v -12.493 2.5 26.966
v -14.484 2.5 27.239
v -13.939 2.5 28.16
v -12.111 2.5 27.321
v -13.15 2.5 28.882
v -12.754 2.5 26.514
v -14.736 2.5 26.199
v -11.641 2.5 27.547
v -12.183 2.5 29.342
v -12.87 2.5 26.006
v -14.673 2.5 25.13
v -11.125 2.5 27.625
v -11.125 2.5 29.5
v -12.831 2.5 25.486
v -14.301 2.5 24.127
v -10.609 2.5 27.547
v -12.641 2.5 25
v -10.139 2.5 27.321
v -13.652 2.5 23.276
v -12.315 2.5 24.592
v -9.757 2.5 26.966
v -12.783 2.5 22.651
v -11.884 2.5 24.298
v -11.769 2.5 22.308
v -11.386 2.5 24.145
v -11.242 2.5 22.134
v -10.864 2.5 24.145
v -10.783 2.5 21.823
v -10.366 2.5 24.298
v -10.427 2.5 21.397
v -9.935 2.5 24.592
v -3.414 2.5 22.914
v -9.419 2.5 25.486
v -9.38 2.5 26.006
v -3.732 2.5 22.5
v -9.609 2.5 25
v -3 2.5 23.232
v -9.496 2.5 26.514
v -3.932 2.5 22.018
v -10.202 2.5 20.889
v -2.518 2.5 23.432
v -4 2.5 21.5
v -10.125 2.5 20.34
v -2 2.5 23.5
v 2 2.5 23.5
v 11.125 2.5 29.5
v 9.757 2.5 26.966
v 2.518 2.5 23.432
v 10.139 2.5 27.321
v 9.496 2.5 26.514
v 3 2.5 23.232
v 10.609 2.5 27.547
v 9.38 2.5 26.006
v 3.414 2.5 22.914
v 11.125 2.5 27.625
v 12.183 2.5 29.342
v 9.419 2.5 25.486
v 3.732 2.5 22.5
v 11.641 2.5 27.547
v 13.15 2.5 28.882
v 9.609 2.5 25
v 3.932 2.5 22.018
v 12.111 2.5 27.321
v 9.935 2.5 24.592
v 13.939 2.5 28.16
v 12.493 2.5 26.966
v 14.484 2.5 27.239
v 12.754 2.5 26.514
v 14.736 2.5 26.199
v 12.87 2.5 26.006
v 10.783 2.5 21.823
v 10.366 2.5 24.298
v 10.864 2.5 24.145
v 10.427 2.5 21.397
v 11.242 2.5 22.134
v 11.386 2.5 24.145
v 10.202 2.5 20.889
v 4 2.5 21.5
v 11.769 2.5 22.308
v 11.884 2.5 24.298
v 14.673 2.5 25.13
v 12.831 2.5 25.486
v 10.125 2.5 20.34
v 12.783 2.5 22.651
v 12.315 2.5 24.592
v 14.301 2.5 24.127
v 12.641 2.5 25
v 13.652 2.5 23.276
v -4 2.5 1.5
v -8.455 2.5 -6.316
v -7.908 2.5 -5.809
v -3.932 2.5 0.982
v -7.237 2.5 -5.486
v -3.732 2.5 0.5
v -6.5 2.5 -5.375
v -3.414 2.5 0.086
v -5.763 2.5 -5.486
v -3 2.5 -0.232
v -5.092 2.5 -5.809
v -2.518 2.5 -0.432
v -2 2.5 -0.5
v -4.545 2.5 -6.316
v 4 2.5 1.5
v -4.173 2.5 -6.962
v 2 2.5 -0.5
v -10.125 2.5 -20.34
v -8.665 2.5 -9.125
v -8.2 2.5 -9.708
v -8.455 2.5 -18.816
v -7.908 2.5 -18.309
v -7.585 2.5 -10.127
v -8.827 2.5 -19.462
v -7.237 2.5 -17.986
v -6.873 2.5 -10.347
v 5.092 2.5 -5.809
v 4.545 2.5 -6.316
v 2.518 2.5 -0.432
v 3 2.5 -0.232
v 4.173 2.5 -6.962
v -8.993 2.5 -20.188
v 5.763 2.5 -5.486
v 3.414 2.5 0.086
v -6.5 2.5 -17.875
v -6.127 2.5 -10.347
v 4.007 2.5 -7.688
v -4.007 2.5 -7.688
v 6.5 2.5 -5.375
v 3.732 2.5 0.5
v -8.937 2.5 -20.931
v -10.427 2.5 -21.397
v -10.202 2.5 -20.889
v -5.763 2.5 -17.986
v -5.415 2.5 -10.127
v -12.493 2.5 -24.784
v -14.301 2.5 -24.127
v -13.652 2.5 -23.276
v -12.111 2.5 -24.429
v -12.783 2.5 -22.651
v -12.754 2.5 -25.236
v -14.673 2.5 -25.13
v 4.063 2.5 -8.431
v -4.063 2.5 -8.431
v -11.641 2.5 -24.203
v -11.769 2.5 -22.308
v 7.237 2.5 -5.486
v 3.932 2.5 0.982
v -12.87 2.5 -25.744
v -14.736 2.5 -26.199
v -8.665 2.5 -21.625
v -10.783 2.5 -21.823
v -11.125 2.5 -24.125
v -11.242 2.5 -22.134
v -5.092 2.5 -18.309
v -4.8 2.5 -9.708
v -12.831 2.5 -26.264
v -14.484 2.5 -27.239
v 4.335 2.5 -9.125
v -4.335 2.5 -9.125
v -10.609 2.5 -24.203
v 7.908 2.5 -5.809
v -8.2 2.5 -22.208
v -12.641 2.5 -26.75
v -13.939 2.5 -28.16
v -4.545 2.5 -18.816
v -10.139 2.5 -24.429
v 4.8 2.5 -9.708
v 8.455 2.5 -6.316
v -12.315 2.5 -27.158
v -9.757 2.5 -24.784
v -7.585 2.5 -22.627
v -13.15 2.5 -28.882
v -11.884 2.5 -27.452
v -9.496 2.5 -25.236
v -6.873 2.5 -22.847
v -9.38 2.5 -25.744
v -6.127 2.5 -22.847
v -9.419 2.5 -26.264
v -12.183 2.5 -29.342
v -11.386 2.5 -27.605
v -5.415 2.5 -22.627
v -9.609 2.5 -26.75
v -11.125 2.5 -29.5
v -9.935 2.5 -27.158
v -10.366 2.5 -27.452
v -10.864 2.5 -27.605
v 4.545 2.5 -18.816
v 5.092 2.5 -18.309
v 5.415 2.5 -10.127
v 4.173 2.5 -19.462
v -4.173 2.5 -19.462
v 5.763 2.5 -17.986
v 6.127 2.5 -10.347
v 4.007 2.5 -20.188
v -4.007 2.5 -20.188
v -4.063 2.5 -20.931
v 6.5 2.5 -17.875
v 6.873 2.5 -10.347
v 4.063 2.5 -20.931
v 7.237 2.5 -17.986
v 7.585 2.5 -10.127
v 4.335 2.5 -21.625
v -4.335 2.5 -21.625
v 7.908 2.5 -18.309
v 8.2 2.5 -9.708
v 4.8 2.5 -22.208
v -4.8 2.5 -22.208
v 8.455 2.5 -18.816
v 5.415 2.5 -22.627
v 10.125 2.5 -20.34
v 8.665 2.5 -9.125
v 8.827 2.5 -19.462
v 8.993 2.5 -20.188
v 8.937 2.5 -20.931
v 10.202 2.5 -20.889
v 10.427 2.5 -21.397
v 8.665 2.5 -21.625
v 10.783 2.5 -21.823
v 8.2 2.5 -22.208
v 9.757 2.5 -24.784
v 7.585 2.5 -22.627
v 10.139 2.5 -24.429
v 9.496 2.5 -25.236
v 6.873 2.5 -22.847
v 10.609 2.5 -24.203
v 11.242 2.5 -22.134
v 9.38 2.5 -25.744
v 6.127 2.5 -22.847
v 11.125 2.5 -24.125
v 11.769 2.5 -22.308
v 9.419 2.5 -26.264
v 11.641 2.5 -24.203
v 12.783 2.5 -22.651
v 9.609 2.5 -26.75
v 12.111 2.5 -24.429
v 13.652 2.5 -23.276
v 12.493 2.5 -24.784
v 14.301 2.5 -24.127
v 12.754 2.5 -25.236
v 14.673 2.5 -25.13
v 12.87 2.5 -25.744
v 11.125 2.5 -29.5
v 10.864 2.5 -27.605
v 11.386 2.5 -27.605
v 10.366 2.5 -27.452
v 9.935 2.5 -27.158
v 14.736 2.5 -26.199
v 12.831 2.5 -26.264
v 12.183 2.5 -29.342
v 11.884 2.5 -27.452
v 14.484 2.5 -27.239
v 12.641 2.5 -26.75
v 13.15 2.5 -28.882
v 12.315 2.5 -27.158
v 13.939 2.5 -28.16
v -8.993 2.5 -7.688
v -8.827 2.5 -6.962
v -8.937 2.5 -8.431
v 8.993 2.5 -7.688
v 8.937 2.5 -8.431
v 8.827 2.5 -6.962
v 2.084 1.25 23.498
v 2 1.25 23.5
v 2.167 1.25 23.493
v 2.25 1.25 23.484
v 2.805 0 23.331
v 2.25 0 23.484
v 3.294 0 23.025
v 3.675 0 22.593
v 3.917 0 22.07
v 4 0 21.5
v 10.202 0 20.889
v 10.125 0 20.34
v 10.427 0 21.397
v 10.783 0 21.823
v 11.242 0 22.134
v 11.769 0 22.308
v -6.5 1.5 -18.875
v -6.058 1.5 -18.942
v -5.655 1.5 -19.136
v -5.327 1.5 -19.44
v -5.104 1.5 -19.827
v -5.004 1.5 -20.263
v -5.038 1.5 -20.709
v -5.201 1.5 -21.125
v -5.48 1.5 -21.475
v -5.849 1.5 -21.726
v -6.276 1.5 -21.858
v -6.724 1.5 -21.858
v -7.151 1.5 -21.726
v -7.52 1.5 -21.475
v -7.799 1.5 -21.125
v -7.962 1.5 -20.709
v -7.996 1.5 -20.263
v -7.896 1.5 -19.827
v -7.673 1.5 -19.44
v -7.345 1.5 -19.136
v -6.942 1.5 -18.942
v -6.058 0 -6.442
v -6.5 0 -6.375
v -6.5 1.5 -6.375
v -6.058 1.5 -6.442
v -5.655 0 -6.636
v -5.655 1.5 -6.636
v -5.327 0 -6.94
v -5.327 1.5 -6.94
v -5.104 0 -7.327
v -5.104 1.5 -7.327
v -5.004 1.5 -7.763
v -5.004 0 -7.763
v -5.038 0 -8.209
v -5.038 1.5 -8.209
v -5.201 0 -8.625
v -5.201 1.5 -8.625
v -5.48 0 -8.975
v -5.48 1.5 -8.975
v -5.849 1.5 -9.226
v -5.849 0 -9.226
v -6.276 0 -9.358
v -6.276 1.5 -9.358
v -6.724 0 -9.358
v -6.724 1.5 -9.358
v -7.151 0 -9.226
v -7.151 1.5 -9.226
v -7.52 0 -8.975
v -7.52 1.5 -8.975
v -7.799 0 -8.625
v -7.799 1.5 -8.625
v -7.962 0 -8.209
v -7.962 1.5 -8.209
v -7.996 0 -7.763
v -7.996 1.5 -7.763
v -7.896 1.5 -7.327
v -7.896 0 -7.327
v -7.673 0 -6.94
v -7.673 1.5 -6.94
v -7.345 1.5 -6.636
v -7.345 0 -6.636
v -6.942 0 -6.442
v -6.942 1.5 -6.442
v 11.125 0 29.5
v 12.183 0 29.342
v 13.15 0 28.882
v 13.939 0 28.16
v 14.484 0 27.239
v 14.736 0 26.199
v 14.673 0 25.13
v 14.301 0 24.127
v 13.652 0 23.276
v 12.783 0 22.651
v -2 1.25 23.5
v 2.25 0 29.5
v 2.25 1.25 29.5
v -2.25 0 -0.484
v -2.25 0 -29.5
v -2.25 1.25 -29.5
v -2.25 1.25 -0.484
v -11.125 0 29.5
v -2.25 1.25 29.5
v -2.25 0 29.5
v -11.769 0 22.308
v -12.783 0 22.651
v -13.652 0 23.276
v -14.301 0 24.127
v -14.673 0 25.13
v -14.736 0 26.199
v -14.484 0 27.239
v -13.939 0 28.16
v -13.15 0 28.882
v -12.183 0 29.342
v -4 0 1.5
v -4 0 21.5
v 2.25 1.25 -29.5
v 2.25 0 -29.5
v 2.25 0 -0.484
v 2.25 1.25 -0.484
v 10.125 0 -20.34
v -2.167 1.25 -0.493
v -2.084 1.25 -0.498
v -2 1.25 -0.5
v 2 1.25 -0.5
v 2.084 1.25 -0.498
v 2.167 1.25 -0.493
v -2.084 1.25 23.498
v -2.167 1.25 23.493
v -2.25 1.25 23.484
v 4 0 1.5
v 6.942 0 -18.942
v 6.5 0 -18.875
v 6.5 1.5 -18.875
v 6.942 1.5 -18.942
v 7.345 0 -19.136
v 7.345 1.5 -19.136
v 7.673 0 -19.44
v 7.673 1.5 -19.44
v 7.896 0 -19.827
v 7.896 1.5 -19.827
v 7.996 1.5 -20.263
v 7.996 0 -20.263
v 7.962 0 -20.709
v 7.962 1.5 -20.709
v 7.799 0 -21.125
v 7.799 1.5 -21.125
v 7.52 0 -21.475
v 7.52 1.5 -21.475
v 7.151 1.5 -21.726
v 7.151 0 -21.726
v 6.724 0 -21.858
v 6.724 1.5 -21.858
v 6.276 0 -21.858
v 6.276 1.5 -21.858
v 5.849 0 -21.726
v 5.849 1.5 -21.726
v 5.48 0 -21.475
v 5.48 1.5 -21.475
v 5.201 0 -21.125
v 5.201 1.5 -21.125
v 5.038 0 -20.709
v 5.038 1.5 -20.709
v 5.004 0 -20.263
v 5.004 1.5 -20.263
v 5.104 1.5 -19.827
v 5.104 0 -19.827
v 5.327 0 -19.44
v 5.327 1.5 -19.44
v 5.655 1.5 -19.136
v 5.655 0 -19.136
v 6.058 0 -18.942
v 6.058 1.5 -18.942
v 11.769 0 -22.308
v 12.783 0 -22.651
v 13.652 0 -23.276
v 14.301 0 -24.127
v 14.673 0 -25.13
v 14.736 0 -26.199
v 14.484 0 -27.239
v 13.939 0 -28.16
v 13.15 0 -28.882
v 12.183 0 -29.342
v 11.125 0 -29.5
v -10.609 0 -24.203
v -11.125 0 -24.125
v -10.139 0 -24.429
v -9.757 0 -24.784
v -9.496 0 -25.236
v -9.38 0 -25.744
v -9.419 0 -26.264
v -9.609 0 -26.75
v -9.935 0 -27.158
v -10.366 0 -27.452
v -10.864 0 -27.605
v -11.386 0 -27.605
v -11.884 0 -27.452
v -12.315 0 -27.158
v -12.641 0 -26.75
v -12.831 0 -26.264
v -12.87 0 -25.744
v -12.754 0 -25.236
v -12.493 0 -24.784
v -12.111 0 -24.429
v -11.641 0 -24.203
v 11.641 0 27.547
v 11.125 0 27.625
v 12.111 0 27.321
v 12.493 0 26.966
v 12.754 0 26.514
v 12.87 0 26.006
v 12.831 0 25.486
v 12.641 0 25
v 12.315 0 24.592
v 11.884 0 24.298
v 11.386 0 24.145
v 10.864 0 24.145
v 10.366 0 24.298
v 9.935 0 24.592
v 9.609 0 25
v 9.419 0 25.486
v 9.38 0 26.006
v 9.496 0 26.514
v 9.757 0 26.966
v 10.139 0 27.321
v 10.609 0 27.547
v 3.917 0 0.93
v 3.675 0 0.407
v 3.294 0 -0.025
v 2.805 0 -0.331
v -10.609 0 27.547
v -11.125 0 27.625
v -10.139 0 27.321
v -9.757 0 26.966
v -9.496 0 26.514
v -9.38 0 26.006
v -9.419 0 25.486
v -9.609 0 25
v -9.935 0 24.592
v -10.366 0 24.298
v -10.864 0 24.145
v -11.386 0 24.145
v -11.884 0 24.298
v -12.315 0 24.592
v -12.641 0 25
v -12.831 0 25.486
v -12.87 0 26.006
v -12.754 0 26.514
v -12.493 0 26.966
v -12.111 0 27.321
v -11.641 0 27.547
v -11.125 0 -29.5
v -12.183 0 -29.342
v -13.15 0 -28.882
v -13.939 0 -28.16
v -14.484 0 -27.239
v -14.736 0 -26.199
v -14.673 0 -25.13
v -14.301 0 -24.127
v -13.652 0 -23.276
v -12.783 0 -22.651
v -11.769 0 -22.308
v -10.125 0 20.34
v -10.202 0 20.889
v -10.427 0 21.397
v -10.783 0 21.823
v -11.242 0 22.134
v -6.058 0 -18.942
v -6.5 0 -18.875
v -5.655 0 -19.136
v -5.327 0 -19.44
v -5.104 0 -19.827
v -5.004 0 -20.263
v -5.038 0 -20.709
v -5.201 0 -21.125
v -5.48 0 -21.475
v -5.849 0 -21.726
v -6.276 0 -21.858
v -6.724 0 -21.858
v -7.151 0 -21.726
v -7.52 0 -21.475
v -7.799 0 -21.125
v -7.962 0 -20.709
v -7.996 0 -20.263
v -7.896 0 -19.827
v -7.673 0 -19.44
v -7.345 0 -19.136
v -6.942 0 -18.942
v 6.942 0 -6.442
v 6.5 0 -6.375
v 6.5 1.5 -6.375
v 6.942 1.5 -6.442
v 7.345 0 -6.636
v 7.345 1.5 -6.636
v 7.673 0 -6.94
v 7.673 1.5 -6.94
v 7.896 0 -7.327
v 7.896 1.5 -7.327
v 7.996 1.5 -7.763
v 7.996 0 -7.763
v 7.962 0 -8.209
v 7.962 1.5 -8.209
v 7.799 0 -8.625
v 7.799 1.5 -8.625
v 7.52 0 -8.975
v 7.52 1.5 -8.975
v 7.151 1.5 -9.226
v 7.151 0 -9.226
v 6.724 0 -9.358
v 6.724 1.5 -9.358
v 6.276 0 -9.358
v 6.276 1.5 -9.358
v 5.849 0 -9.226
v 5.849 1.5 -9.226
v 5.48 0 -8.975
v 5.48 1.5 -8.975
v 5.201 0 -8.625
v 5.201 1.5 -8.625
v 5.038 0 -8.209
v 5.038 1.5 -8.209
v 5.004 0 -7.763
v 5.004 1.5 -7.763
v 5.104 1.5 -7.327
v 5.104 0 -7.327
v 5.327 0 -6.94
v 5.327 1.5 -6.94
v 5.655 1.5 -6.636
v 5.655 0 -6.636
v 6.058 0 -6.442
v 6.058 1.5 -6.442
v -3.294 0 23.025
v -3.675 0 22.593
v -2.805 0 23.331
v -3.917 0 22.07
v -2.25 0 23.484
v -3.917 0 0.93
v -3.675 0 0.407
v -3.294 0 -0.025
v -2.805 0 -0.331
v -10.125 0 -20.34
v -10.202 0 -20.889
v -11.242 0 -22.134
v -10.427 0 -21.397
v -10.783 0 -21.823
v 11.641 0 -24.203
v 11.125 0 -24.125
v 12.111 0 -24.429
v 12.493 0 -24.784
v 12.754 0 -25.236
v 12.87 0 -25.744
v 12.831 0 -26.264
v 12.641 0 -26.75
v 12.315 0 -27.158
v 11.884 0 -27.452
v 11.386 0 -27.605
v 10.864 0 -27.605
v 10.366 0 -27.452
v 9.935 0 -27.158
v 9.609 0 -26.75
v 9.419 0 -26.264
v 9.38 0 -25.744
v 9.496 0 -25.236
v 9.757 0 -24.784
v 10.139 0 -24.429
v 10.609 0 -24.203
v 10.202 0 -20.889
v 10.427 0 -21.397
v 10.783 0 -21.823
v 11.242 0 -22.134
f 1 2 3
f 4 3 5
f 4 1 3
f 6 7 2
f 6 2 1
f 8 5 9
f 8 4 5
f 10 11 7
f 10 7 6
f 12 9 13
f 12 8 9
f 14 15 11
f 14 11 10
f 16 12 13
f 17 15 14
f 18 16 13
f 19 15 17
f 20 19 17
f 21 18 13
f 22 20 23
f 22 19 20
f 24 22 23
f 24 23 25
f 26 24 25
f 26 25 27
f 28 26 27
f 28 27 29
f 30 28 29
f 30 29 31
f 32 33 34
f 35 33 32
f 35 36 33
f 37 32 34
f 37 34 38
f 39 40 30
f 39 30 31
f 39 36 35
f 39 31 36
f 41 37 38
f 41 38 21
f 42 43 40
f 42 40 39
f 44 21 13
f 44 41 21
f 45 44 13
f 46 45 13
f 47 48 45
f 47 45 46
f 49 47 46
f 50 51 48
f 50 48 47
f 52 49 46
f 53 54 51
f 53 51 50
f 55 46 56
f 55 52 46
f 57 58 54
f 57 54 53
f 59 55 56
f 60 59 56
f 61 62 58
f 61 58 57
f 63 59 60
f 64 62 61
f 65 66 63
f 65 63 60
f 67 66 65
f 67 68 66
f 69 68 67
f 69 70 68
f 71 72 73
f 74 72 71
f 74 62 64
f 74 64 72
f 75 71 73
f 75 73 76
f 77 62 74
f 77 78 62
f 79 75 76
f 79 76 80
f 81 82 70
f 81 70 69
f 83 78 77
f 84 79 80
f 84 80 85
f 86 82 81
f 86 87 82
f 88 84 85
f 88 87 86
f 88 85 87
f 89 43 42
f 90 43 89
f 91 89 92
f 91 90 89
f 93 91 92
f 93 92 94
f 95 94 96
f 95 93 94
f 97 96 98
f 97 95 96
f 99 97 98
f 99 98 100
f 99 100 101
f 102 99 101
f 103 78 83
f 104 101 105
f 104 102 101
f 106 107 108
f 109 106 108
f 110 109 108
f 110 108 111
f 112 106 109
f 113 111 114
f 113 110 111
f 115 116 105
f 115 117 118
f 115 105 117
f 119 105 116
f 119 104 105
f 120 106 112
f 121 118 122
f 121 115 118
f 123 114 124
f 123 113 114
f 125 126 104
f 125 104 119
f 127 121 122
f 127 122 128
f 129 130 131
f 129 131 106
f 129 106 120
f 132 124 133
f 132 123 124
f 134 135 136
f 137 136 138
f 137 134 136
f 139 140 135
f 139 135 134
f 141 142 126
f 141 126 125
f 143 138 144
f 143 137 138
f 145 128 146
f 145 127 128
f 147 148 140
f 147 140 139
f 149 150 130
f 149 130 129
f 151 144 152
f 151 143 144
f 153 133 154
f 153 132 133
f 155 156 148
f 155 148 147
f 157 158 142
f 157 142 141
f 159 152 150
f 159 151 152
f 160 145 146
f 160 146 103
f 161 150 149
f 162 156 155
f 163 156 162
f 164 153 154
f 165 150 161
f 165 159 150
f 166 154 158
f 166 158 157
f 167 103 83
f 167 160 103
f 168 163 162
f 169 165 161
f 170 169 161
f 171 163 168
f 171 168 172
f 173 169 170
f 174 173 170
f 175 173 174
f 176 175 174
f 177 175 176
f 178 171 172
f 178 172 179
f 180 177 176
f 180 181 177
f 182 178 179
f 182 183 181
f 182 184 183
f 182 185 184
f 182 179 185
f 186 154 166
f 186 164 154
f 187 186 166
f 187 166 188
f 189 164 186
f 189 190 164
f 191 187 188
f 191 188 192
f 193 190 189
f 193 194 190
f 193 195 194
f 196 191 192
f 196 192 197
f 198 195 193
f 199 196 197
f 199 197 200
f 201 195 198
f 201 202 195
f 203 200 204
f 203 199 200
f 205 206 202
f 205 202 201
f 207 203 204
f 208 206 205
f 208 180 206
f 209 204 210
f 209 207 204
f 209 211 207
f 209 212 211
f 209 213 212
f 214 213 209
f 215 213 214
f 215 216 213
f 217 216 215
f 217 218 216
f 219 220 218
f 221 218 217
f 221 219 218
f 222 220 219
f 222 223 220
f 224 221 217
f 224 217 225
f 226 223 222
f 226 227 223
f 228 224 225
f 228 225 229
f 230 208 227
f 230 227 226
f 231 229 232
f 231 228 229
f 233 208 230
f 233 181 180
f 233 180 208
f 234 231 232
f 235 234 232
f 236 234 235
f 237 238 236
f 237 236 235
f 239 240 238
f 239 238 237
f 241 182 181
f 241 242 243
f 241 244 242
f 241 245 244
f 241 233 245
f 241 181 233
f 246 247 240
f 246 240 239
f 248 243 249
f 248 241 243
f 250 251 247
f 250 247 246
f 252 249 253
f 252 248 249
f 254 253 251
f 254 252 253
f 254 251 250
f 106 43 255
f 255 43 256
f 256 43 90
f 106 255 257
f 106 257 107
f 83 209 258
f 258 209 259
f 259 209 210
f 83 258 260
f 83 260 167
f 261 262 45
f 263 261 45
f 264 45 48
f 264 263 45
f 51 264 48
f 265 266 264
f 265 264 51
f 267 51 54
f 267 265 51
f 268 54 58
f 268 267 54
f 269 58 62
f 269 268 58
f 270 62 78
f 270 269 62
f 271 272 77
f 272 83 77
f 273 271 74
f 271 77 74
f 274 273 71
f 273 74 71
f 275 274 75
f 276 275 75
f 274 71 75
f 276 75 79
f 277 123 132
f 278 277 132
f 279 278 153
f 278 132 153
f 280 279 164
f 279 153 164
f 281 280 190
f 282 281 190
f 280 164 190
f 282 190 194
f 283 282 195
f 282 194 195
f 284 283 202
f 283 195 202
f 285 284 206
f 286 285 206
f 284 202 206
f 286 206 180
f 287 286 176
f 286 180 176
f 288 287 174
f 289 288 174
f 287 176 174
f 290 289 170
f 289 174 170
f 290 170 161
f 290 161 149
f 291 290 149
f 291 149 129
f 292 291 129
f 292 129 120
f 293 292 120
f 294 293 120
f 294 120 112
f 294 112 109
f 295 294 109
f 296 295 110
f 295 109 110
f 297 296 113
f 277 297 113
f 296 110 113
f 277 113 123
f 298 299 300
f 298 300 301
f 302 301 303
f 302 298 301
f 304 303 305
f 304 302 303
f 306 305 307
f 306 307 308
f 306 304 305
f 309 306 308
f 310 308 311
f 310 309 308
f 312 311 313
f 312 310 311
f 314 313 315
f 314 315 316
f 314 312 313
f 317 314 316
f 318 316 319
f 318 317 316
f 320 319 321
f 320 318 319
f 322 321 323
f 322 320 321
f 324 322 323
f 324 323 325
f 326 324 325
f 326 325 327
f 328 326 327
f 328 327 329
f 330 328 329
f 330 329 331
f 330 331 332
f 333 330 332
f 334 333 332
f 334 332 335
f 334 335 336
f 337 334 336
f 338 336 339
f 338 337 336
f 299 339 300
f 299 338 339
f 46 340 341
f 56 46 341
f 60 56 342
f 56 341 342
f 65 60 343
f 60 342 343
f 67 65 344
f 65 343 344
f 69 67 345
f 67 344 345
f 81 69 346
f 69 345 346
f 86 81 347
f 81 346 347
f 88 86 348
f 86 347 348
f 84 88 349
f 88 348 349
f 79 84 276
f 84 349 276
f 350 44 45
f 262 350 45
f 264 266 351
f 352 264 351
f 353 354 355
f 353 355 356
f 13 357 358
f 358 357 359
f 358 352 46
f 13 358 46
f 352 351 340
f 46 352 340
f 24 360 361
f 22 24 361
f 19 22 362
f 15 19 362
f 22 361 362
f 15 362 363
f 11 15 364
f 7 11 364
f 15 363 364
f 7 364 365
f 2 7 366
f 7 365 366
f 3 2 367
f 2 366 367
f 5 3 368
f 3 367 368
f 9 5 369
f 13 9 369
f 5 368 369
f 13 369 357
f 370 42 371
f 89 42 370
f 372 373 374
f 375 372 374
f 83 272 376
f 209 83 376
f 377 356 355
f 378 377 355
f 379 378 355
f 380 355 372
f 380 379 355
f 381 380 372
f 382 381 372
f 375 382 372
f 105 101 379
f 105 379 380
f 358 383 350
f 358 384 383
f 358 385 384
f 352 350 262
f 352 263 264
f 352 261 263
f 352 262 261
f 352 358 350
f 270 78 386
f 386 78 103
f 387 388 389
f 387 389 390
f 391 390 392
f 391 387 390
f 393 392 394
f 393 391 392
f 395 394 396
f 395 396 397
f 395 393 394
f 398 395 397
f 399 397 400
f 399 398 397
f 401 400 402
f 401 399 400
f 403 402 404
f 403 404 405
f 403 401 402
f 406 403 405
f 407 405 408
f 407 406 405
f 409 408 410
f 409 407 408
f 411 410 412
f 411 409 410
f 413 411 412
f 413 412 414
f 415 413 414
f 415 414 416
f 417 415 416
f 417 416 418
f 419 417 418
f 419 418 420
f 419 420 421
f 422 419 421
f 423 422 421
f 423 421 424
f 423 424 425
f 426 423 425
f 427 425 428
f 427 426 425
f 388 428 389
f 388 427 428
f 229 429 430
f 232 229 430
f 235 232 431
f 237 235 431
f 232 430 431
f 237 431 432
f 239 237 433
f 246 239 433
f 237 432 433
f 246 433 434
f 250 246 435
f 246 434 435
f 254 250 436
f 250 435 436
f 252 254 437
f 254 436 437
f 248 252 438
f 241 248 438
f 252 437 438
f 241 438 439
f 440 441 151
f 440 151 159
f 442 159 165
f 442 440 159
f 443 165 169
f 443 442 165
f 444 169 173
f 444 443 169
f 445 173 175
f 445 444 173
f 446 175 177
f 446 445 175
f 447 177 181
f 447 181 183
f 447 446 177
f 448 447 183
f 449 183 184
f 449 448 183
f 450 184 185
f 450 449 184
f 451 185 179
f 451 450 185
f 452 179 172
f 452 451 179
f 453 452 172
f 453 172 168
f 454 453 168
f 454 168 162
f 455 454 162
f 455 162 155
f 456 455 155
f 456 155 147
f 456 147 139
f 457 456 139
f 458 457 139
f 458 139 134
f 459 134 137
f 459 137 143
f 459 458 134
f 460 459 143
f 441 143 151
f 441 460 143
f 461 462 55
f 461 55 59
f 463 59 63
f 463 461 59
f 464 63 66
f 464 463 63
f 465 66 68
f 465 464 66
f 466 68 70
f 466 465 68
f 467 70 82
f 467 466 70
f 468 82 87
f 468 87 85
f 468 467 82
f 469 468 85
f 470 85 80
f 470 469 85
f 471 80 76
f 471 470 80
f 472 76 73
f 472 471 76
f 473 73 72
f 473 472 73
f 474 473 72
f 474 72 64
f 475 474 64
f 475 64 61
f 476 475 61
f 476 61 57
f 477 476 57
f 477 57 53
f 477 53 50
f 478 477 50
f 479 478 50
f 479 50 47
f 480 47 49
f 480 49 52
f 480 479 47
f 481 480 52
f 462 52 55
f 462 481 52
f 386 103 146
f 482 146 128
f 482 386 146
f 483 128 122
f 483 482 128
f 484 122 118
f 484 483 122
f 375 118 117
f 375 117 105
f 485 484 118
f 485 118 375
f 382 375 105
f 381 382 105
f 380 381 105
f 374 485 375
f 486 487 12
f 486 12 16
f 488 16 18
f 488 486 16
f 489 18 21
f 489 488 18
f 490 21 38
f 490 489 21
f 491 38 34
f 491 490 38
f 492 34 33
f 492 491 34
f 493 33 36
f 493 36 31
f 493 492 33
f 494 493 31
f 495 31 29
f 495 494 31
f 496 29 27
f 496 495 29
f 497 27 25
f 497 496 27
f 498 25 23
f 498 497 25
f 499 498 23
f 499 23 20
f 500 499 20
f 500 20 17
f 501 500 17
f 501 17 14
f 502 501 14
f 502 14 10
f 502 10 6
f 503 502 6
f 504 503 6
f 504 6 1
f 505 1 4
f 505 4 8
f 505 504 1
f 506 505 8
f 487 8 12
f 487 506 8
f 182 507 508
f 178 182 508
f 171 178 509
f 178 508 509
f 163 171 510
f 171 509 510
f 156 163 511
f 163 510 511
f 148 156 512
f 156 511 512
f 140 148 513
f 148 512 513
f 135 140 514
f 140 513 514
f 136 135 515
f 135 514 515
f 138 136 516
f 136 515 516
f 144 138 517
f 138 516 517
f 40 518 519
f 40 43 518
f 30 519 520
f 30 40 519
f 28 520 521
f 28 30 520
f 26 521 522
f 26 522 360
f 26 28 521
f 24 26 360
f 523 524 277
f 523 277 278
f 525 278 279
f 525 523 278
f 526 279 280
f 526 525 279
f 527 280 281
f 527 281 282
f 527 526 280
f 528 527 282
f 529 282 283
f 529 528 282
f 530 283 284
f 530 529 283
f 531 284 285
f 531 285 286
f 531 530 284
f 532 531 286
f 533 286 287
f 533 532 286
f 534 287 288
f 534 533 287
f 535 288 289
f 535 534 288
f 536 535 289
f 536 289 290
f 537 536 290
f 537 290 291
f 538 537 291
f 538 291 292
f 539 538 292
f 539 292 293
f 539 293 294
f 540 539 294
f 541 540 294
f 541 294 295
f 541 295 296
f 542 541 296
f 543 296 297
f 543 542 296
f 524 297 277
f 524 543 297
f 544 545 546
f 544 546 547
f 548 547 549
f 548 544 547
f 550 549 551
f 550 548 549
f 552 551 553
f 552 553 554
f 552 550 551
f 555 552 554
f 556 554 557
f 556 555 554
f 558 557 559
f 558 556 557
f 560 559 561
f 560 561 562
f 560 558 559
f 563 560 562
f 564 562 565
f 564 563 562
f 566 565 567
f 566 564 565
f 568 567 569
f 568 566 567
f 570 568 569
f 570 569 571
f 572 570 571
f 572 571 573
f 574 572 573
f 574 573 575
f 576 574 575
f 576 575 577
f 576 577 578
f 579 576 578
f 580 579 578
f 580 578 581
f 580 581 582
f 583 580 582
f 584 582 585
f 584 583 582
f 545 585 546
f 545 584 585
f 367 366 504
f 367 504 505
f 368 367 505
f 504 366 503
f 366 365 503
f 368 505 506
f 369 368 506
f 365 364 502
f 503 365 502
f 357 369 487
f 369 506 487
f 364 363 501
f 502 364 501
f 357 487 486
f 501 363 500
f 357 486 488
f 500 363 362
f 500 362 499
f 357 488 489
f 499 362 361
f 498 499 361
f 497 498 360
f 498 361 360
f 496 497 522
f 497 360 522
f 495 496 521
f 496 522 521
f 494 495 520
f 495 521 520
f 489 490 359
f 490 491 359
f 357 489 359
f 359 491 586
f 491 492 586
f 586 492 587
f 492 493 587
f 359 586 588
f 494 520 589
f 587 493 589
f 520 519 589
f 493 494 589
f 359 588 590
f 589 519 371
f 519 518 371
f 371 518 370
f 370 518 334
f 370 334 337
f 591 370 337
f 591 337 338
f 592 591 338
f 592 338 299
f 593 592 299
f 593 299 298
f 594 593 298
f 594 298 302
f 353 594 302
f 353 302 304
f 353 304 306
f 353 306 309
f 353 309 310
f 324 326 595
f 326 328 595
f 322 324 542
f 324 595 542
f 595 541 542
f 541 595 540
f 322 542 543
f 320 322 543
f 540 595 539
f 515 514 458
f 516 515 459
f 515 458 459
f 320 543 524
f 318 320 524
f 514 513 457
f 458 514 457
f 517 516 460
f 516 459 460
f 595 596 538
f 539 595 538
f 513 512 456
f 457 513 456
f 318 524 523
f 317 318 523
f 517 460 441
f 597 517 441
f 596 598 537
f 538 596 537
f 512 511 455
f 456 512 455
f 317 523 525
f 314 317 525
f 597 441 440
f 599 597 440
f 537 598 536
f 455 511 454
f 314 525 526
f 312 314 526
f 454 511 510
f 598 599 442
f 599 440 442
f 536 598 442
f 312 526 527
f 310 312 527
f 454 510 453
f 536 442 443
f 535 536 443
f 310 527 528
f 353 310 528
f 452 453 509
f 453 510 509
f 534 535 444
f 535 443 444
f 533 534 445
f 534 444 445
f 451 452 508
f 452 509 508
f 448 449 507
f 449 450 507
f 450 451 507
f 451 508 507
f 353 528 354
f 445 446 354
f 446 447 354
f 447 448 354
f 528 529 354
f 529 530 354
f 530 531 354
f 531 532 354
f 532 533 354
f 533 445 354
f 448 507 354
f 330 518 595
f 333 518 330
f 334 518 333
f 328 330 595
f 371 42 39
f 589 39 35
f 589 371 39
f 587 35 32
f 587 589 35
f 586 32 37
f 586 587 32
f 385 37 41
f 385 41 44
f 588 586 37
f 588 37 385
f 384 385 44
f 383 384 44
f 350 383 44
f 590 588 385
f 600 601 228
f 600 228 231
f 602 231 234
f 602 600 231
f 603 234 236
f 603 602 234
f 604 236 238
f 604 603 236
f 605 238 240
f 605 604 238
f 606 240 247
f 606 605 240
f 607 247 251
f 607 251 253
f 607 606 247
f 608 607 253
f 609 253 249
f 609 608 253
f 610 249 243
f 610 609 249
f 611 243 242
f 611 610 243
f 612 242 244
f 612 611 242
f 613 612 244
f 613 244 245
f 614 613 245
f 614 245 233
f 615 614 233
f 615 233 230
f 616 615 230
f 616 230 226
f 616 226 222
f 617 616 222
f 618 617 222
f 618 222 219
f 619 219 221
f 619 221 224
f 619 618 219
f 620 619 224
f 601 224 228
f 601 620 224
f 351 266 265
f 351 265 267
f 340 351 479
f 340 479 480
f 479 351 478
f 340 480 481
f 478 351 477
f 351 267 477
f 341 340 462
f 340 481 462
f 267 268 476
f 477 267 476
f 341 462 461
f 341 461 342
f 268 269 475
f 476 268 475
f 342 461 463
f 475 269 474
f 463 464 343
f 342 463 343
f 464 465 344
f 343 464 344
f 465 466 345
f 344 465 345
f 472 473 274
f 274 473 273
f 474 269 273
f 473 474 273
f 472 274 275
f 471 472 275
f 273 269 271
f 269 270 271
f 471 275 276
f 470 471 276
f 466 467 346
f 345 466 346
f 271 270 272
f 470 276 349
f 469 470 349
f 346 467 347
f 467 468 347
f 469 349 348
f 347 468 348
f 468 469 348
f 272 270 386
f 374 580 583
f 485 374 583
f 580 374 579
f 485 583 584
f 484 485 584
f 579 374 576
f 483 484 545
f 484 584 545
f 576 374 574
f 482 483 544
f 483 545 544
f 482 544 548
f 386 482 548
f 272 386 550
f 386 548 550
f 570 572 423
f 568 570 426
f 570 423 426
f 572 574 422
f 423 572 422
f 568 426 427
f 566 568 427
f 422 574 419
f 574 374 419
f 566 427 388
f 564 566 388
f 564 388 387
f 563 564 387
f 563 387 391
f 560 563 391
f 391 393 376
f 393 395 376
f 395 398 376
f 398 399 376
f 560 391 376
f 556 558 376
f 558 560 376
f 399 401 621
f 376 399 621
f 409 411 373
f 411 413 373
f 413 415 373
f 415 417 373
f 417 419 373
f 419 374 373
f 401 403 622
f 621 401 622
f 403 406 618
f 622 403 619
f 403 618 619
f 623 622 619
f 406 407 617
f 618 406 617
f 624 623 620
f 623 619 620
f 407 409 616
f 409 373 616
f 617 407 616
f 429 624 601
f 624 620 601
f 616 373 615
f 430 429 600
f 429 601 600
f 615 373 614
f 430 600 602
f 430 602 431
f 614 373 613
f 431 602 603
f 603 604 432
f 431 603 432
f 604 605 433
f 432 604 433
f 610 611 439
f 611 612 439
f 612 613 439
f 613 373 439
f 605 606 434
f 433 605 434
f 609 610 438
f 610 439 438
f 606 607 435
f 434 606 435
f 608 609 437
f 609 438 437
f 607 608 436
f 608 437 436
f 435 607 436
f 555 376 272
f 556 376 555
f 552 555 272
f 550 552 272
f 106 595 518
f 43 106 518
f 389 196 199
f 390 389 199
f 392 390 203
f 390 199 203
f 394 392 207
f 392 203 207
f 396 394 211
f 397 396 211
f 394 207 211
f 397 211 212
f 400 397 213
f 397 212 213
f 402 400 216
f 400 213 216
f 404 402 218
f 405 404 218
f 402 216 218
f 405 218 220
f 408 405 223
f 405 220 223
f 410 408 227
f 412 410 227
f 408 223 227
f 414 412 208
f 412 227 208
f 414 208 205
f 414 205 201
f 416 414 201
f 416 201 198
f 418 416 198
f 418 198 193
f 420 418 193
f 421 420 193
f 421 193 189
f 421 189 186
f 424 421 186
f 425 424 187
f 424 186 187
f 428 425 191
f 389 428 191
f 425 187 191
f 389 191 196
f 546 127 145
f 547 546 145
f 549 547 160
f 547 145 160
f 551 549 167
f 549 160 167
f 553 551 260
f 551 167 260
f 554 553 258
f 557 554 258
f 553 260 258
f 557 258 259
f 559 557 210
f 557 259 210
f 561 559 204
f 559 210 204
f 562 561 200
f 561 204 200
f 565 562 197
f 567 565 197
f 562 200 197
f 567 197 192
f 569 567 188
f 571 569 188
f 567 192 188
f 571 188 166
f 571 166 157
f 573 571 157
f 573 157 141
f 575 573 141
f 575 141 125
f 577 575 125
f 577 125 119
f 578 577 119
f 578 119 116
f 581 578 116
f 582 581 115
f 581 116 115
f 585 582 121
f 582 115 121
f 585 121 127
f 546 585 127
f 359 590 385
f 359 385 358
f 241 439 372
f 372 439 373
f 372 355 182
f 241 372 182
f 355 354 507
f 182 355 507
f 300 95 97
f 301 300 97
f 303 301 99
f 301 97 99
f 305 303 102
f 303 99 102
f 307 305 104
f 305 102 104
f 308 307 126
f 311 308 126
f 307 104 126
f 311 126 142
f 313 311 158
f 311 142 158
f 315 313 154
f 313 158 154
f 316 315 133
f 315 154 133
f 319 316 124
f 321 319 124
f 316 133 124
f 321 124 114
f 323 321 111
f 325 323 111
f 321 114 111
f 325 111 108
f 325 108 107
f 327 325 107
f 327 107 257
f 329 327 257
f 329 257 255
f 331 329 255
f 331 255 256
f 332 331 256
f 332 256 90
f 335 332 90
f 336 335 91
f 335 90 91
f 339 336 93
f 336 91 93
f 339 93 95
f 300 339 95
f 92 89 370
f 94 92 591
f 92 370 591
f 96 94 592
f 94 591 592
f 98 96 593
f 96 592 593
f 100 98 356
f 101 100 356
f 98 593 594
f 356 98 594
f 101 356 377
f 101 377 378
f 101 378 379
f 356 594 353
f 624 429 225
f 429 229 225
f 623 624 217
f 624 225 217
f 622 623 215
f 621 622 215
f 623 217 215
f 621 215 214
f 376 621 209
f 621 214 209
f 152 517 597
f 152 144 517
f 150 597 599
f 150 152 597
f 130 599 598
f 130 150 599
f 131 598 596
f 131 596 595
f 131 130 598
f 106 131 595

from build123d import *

# Parameters (mm, degrees)
SKETCH1_R           = 1.5
SKETCH1_R_2         = 1.75
BOSS_EXTRUDE1_DEPTH = 2.5
CHAMFER1_SIZE       = 1
CUT_EXTRUDE1_REACH  = 35.077
SKETCH2_W           = 8
SKETCH2_H           = 24
FILLET1_R           = 2
SKETCH3_W           = 4.5
SKETCH3_H           = 59
CUT_EXTRUDE2_DEPTH  = 1.25


with BuildPart() as part:
    # Sketch1 → Boss-Extrude1 (new body)
    with BuildSketch(Plane(origin=(0, 0, 0), x_dir=(1, 0, 0), z_dir=(0, 1, 0))):
        with BuildLine():
            Line((11.125, 29.5), (-11.125, 29.5))
            ThreePointArc((-11.125, 29.5), (-14.714662754, 25.370077916), (-10.125, 22.390660034))
            Line((-10.125, 22.390660034), (-10.125, -22.390660034))
            ThreePointArc((-10.125, -22.390660034), (-14.714662754, -25.370077916), (-11.125, -29.5))
            Line((-11.125, -29.5), (11.125, -29.5))
            ThreePointArc((11.125, -29.5), (14.714662754, -25.370077916), (10.125, -22.390660034))
            Line((10.125, -22.390660034), (10.125, 22.390660034))
            ThreePointArc((10.125, 22.390660034), (14.714662754, 25.370077916), (11.125, 29.5))
        make_face()
        with Locations(Location((-6.5, 7.875, 0), (0, 0, 270))):
            Circle(SKETCH1_R, mode=Mode.SUBTRACT)
        with Locations(Location((6.5, 20.375, 0), (0, 0, 270))):
            Circle(SKETCH1_R, mode=Mode.SUBTRACT)
        with Locations(Location((-6.5, 20.375, 0), (0, 0, 270))):
            Circle(SKETCH1_R, mode=Mode.SUBTRACT)
        with Locations(Location((6.5, 7.875, 0), (0, 0, 270))):
            Circle(SKETCH1_R, mode=Mode.SUBTRACT)
        with Locations(Location((-11.125, 25.875, 0), (0, 0, 270))):
            Circle(SKETCH1_R_2, mode=Mode.SUBTRACT)
        with Locations(Location((11.125, 25.875, 0), (0, 0, 270))):
            Circle(SKETCH1_R_2, mode=Mode.SUBTRACT)
        with Locations(Location((-11.125, -25.875, 0), (0, 0, 270))):
            Circle(SKETCH1_R_2, mode=Mode.SUBTRACT)
        with Locations(Location((11.125, -25.875, 0), (0, 0, 270))):
            Circle(SKETCH1_R_2, mode=Mode.SUBTRACT)
    extrude(amount=BOSS_EXTRUDE1_DEPTH)

    # Chamfer1
    chamfer1_edges = [part.edges().sort_by_distance(p)[0] for p in [
        (6.5, 2.5, -21.875),
        (-6.5, 2.5, -21.875),
        (-6.5, 2.5, -9.375),
        (6.5, 2.5, -9.375),
    ]]
    chamfer(chamfer1_edges, length=CHAMFER1_SIZE)

    # Sketch2 → Cut-Extrude1 (cut, up to next)
    with BuildSketch(Plane(origin=(0, 2.5, 0), x_dir=(1, 0, 0), z_dir=(0, 1, 0)), mode=Mode.PRIVATE) as cut_extrude1_sk1:
        with Locations((0, -11.5)):
            Rectangle(SKETCH2_W, SKETCH2_H)
    cut_extrude1_tool1 = extrude(cut_extrude1_sk1.sketch, amount=-CUT_EXTRUDE1_REACH, mode=Mode.PRIVATE) & part.part
    add(cut_extrude1_tool1.solids().sort_by_distance((0, 2.5, 11.5))[0], mode=Mode.SUBTRACT)

    # Fillet1
    fillet1_edges = [part.edges().sort_by_distance(p)[0] for p in [
        (-10.125, 1.25, 22.390660034),
        (-10.125, 1.25, -22.390660034),
        (10.125, 1.25, -22.390660034),
        (10.125, 1.25, 22.390660034),
        (4, 1.25, -0.5),
        (4, 1.25, 23.5),
        (-4, 1.25, 23.5),
        (-4, 1.25, -0.5),
    ]]
    fillet(fillet1_edges, radius=FILLET1_R)

    # Sketch3 → Cut-Extrude2 (cut)
    with BuildSketch(Plane.XZ):
        Rectangle(SKETCH3_W, SKETCH3_H)
    extrude(amount=-CUT_EXTRUDE2_DEPTH, mode=Mode.SUBTRACT)


solid = part.part
